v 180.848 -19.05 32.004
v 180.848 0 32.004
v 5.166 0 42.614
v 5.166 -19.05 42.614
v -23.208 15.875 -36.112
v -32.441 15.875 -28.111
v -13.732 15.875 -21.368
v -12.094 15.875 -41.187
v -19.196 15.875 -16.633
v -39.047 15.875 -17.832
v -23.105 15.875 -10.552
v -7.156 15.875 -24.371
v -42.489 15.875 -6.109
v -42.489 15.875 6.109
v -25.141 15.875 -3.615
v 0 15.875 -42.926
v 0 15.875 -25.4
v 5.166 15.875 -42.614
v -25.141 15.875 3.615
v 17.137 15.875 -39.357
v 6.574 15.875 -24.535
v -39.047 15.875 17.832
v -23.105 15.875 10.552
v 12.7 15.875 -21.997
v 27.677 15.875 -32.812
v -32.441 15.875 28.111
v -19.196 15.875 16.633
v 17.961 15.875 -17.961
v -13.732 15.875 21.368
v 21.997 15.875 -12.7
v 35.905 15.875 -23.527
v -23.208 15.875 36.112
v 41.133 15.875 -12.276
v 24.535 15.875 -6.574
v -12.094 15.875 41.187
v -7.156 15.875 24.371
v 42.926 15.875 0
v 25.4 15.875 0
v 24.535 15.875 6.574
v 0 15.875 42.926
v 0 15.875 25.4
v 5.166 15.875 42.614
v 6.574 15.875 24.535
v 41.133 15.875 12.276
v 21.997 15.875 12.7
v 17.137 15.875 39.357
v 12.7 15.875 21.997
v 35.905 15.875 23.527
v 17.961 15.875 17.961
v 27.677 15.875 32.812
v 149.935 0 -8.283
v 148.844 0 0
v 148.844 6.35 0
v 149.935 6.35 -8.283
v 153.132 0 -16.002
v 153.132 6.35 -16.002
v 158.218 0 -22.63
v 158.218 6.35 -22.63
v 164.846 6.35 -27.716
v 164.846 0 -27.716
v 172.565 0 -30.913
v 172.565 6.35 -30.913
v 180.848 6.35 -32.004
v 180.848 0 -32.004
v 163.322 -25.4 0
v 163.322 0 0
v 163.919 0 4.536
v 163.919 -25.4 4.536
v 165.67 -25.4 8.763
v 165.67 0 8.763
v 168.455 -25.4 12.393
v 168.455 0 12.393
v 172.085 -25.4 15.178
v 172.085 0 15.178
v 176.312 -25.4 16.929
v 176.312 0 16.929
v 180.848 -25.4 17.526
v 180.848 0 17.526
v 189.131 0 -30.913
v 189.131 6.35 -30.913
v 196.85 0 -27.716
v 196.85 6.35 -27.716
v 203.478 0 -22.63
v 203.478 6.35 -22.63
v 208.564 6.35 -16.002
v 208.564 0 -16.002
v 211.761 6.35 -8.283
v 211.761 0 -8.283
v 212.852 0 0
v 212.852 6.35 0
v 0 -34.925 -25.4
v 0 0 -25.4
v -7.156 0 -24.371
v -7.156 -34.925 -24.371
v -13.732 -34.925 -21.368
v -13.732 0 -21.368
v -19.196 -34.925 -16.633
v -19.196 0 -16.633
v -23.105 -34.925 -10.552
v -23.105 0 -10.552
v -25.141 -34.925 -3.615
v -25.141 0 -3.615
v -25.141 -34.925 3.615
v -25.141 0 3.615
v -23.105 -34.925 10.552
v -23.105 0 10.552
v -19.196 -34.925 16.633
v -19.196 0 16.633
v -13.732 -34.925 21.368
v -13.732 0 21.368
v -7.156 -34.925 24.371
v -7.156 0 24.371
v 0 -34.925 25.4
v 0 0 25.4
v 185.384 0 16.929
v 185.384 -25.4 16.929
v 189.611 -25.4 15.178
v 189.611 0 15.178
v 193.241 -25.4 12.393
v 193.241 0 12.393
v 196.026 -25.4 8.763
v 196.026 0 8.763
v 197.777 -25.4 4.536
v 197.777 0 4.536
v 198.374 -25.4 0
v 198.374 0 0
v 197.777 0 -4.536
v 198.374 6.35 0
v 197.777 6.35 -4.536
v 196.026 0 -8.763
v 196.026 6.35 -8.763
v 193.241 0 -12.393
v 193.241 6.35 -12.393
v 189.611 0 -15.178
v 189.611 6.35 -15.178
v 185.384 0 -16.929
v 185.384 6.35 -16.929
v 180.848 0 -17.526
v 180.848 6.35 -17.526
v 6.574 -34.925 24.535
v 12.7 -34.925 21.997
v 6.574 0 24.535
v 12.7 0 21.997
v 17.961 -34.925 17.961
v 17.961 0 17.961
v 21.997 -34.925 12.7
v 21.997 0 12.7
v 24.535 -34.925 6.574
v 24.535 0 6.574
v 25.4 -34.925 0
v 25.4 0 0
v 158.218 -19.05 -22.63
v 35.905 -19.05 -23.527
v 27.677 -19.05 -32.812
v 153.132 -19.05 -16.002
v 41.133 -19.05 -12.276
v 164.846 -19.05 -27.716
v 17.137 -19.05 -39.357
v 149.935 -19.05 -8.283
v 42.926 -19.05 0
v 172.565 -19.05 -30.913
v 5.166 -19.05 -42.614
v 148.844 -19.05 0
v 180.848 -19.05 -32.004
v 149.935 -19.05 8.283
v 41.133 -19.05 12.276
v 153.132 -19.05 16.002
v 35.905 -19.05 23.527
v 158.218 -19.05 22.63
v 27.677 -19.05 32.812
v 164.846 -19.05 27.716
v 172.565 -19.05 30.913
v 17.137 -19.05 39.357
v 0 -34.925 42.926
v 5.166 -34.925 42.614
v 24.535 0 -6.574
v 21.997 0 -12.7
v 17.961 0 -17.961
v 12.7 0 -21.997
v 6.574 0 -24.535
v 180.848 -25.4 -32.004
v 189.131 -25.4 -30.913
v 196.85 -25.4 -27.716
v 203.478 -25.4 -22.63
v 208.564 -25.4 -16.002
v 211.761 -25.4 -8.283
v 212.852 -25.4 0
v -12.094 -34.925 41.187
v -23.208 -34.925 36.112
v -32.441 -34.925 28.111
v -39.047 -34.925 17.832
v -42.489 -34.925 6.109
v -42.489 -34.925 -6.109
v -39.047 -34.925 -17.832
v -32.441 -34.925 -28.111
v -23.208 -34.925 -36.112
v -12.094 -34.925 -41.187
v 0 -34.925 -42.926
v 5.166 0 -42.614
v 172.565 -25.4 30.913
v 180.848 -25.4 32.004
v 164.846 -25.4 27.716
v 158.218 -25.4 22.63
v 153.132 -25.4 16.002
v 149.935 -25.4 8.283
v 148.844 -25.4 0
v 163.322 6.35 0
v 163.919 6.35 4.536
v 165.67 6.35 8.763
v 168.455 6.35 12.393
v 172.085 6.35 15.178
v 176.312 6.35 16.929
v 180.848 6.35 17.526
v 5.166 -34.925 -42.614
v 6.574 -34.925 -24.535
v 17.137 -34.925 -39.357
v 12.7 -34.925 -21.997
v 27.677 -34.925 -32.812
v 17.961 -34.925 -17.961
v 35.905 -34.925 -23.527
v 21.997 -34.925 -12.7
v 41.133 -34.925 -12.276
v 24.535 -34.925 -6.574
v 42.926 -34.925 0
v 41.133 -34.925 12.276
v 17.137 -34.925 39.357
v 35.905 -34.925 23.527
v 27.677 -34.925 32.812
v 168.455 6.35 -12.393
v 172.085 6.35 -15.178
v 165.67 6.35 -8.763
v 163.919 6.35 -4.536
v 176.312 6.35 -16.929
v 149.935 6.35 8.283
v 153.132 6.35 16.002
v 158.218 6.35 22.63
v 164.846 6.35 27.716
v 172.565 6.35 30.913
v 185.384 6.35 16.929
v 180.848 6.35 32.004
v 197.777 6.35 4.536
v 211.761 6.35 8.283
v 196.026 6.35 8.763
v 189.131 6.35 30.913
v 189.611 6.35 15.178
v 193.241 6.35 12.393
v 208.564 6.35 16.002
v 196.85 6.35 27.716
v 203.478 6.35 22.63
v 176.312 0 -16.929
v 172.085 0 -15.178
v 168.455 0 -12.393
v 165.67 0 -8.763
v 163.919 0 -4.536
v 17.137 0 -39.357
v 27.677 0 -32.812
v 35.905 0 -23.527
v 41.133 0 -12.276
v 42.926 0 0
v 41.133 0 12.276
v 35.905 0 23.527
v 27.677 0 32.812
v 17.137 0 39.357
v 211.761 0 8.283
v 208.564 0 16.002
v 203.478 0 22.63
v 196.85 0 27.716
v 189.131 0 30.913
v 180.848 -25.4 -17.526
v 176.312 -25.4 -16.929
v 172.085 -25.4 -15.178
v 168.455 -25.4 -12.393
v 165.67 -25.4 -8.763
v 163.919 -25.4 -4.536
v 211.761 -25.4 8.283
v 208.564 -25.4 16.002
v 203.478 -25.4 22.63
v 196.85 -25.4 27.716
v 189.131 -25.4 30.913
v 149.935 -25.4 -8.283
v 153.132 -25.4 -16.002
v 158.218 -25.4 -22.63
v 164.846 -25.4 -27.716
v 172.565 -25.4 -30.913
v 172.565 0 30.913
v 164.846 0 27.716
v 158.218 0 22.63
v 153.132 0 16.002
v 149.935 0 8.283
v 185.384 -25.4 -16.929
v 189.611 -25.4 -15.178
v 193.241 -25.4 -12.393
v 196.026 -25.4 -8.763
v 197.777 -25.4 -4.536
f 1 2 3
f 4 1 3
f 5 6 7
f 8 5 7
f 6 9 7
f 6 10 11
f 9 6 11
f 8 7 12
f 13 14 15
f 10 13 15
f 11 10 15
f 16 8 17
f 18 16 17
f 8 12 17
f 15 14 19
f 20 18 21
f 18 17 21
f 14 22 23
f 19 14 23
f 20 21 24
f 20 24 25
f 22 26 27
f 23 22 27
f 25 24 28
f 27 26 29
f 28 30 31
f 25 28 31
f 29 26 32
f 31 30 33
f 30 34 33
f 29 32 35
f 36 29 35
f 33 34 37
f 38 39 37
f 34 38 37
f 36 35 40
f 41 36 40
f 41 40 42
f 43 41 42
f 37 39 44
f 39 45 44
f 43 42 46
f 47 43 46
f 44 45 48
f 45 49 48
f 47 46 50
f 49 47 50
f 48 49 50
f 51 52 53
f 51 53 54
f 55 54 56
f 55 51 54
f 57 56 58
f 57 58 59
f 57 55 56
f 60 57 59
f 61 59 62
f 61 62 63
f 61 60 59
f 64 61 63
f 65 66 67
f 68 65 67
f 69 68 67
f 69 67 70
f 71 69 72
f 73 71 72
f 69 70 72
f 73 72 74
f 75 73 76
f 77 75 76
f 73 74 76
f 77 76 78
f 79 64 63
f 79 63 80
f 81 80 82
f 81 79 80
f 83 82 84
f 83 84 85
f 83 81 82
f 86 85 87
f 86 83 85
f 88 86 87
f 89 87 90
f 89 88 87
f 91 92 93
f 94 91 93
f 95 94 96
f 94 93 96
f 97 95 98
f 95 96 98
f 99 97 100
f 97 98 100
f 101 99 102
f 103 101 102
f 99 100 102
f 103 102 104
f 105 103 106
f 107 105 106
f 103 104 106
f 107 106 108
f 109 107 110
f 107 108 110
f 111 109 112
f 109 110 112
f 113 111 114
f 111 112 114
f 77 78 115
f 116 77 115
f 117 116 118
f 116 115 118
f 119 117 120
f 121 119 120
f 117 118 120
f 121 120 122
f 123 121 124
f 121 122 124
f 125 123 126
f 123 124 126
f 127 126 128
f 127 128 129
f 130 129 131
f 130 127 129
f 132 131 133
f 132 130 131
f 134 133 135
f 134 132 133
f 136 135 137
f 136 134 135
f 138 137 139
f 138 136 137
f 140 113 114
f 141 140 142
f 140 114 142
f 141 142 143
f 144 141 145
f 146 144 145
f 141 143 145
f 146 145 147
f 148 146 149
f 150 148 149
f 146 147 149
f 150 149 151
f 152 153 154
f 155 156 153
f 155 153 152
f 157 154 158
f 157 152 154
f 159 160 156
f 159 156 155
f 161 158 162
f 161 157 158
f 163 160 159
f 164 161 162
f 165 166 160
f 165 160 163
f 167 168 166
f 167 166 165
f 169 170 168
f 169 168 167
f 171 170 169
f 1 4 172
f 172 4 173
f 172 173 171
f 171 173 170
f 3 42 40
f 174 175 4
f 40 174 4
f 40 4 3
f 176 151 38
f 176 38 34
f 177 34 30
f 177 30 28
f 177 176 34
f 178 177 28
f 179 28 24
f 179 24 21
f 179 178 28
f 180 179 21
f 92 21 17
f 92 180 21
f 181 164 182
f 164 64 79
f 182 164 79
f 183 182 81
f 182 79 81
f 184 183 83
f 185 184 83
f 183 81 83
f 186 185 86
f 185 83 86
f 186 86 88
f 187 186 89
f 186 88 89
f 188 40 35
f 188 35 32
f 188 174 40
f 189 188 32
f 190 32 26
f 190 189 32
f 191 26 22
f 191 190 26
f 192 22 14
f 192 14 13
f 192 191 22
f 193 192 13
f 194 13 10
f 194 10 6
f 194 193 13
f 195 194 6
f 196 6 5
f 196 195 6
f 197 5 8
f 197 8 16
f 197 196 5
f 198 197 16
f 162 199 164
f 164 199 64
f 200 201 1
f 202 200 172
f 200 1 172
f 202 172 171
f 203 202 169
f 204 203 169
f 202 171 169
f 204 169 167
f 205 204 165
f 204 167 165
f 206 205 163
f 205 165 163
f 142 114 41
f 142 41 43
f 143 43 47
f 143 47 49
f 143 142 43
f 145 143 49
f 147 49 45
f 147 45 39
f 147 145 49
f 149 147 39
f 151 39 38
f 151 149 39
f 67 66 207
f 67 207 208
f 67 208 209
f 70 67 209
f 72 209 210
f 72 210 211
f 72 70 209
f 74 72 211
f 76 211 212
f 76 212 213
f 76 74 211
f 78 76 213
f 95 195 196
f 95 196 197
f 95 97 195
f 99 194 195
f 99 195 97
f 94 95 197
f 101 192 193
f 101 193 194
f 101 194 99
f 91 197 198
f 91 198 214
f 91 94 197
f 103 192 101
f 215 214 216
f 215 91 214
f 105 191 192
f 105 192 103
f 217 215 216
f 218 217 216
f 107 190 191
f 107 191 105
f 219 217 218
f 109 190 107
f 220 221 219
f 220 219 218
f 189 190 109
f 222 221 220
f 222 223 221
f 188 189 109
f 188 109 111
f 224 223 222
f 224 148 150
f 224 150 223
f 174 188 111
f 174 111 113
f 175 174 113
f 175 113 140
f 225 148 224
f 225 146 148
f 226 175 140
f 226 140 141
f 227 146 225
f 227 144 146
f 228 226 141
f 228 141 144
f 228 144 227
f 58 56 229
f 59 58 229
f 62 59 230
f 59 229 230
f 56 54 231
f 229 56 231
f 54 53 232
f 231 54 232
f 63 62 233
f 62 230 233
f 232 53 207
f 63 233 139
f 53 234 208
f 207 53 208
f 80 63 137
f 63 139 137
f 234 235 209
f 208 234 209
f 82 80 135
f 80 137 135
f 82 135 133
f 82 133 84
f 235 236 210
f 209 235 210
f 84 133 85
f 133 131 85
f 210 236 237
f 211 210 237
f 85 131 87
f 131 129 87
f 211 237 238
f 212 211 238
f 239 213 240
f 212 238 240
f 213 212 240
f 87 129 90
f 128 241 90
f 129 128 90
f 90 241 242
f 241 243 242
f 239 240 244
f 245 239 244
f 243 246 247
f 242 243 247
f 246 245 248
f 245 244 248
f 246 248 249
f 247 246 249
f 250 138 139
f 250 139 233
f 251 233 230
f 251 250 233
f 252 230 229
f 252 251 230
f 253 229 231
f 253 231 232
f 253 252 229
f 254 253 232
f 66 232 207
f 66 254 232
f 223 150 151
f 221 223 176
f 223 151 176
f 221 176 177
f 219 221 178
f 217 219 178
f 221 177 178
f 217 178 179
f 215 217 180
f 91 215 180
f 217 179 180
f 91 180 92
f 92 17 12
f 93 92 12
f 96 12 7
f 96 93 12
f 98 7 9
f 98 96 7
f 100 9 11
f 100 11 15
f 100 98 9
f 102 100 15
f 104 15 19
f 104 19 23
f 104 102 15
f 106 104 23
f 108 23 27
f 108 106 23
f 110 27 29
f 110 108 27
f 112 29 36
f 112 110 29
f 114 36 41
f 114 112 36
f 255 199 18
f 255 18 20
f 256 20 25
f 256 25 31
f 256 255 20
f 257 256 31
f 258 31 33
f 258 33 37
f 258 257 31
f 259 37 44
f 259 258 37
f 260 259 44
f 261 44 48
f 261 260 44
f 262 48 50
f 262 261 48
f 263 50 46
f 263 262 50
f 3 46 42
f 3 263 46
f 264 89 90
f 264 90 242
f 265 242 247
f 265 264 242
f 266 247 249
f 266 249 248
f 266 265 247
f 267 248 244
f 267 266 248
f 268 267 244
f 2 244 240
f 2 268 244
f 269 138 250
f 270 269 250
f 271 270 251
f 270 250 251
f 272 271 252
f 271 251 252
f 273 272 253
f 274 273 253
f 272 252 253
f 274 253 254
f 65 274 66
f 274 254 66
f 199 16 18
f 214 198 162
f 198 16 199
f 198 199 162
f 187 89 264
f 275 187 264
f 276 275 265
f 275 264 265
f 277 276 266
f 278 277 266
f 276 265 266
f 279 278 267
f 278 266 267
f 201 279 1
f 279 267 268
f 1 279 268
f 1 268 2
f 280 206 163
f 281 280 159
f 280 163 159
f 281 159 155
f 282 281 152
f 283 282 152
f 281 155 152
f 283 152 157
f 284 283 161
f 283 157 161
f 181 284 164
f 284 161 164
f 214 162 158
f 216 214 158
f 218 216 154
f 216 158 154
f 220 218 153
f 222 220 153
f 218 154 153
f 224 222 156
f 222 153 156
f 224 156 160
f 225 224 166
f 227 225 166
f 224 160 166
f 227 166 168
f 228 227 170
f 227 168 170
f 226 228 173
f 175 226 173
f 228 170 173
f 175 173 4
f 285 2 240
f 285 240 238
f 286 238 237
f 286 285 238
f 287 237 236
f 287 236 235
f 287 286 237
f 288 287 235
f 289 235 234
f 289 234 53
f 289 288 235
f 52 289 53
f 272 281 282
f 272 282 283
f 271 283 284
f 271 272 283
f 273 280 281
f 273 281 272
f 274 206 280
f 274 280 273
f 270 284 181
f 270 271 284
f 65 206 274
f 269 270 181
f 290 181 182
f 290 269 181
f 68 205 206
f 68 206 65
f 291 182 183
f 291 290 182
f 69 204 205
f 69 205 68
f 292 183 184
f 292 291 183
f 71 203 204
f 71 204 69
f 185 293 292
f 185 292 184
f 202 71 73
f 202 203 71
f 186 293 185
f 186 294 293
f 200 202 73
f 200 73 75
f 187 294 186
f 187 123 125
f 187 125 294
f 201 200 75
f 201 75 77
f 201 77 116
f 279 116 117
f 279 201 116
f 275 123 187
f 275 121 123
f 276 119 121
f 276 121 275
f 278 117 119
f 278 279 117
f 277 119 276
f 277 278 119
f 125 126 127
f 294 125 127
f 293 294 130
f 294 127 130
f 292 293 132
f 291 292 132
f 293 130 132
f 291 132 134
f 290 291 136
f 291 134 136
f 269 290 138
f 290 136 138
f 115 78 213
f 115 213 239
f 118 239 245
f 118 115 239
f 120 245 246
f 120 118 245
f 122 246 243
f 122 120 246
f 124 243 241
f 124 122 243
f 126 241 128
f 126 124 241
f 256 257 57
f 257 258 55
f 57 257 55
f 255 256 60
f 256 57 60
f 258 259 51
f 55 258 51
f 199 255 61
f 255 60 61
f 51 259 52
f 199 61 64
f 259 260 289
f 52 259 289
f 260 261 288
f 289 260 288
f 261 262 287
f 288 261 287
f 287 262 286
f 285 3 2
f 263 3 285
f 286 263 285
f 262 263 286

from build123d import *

# Parameters (mm, degrees)
F1_DEPTH = 19.05
F2_DEPTH = 34.925
F3_DEPTH = 25.4
F4_DEPTH = 6.35
F5_DEPTH = 15.875


with BuildPart() as f1:
    # F0 (on Front) → F1 (new body)
    with BuildSketch(Plane.XZ):
        with BuildLine():
            Line((0, -25.4), (0, -42.926))
            Line((0, -42.926), (5.16603969, -42.61400603))
            ThreePointArc((5.16603969, -42.61400603), (32.1278609289, -28.4682635251), (42.926, 0))
            Line((42.926, 0), (25.4, 0))
            ThreePointArc((25.4, 0), (17.9605122421, -17.9605122421), (0, -25.4))
        make_face()
        with BuildLine():
            Line((180.848, 32.004), (5.16603969, 42.61400603))
            ThreePointArc((5.16603969, 42.61400603), (32.1278609289, 28.4682635251), (42.926, 0))
            Line((42.926, 0), (148.844, 0))
            ThreePointArc((148.844, 0), (158.2177545749, 22.6302454251), (180.848, 32.004))
        make_face()
        with BuildLine():
            ThreePointArc((42.926, 0), (32.1278609289, -28.4682635251), (5.16603969, -42.61400603))
            Line((5.16603969, -42.61400603), (180.848, -32.004))
            ThreePointArc((180.848, -32.004), (158.2177545749, -22.6302454251), (148.844, 0))
            Line((148.844, 0), (42.926, 0))
        make_face()
    extrude(amount=F1_DEPTH)

    # F0 (on Front) → F2 (join)
    with BuildSketch(Plane.XZ):
        with BuildLine():
            Line((0, 25.4), (0, 42.926))
            ThreePointArc((0, 42.926), (-42.926, 0), (0, -42.926))
            Line((0, -42.926), (0, -25.4))
            ThreePointArc((0, -25.4), (-25.4, 0), (0, 25.4))
        make_face()
        with BuildLine():
            Line((5.16603969, 42.61400603), (0, 42.926))
            Line((0, 42.926), (0, 25.4))
            ThreePointArc((0, 25.4), (17.9605122421, 17.9605122421), (25.4, 0))
            Line((25.4, 0), (42.926, 0))
            ThreePointArc((42.926, 0), (32.1278609289, 28.4682635251), (5.16603969, 42.61400603))
        make_face()
        with BuildLine():
            Line((0, -25.4), (0, -42.926))
            Line((0, -42.926), (5.16603969, -42.61400603))
            ThreePointArc((5.16603969, -42.61400603), (32.1278609289, -28.4682635251), (42.926, 0))
            Line((42.926, 0), (25.4, 0))
            ThreePointArc((25.4, 0), (17.9605122421, -17.9605122421), (0, -25.4))
        make_face()
    extrude(amount=F2_DEPTH)

    # F0 (on Front) → F3 (join)
    with BuildSketch(Plane.XZ):
        with BuildLine():
            Line((180.848, 17.526), (180.848, 32.004))
            ThreePointArc((180.848, 32.004), (158.2177545749, 22.6302454251), (148.844, 0))
            Line((148.844, 0), (163.322, 0))
            ThreePointArc((163.322, 0), (168.4552465529, 12.3927534471), (180.848, 17.526))
        make_face()
        with BuildLine():
            ThreePointArc((148.844, 0), (158.2177545749, -22.6302454251), (180.848, -32.004))
            Line((180.848, -32.004), (180.848, -17.526))
            ThreePointArc((180.848, -17.526), (168.4552465529, -12.3927534471), (163.322, 0))
            Line((163.322, 0), (148.844, 0))
        make_face()
        with BuildLine():
            ThreePointArc((212.852, 0), (203.4782454251, 22.6302454251), (180.848, 32.004))
            Line((180.848, 32.004), (180.848, 17.526))
            ThreePointArc((180.848, 17.526), (193.2407534471, 12.3927534471), (198.374, 0))
            ThreePointArc((198.374, 0), (193.2407534471, -12.3927534471), (180.848, -17.526))
            Line((180.848, -17.526), (180.848, -32.004))
            ThreePointArc((180.848, -32.004), (203.4782454251, -22.6302454251), (212.852, 0))
        make_face()
    extrude(amount=F3_DEPTH)

    # F0 (on Front) → F4 (join)
    with BuildSketch(Plane.XZ):
        with BuildLine():
            ThreePointArc((212.852, 0), (203.4782454251, 22.6302454251), (180.848, 32.004))
            Line((180.848, 32.004), (180.848, 17.526))
            ThreePointArc((180.848, 17.526), (193.2407534471, 12.3927534471), (198.374, 0))
            ThreePointArc((198.374, 0), (193.2407534471, -12.3927534471), (180.848, -17.526))
            Line((180.848, -17.526), (180.848, -32.004))
            ThreePointArc((180.848, -32.004), (203.4782454251, -22.6302454251), (212.852, 0))
        make_face()
        with BuildLine():
            ThreePointArc((148.844, 0), (158.2177545749, -22.6302454251), (180.848, -32.004))
            Line((180.848, -32.004), (180.848, -17.526))
            ThreePointArc((180.848, -17.526), (168.4552465529, -12.3927534471), (163.322, 0))
            Line((163.322, 0), (148.844, 0))
        make_face()
        with BuildLine():
            Line((180.848, 17.526), (180.848, 32.004))
            ThreePointArc((180.848, 32.004), (158.2177545749, 22.6302454251), (148.844, 0))
            Line((148.844, 0), (163.322, 0))
            ThreePointArc((163.322, 0), (168.4552465529, 12.3927534471), (180.848, 17.526))
        make_face()
    extrude(amount=-F4_DEPTH)

    # F0 (on Front) → F5 (join)
    with BuildSketch(Plane.XZ):
        with BuildLine():
            Line((0, 25.4), (0, 42.926))
            ThreePointArc((0, 42.926), (-42.926, 0), (0, -42.926))
            Line((0, -42.926), (0, -25.4))
            ThreePointArc((0, -25.4), (-25.4, 0), (0, 25.4))
        make_face()
        with BuildLine():
            Line((5.16603969, 42.61400603), (0, 42.926))
            Line((0, 42.926), (0, 25.4))
            ThreePointArc((0, 25.4), (17.9605122421, 17.9605122421), (25.4, 0))
            Line((25.4, 0), (42.926, 0))
            ThreePointArc((42.926, 0), (32.1278609289, 28.4682635251), (5.16603969, 42.61400603))
        make_face()
        with BuildLine():
            Line((0, -25.4), (0, -42.926))
            Line((0, -42.926), (5.16603969, -42.61400603))
            ThreePointArc((5.16603969, -42.61400603), (32.1278609289, -28.4682635251), (42.926, 0))
            Line((42.926, 0), (25.4, 0))
            ThreePointArc((25.4, 0), (17.9605122421, -17.9605122421), (0, -25.4))
        make_face()
    extrude(amount=-F5_DEPTH)


solid = f1.part
